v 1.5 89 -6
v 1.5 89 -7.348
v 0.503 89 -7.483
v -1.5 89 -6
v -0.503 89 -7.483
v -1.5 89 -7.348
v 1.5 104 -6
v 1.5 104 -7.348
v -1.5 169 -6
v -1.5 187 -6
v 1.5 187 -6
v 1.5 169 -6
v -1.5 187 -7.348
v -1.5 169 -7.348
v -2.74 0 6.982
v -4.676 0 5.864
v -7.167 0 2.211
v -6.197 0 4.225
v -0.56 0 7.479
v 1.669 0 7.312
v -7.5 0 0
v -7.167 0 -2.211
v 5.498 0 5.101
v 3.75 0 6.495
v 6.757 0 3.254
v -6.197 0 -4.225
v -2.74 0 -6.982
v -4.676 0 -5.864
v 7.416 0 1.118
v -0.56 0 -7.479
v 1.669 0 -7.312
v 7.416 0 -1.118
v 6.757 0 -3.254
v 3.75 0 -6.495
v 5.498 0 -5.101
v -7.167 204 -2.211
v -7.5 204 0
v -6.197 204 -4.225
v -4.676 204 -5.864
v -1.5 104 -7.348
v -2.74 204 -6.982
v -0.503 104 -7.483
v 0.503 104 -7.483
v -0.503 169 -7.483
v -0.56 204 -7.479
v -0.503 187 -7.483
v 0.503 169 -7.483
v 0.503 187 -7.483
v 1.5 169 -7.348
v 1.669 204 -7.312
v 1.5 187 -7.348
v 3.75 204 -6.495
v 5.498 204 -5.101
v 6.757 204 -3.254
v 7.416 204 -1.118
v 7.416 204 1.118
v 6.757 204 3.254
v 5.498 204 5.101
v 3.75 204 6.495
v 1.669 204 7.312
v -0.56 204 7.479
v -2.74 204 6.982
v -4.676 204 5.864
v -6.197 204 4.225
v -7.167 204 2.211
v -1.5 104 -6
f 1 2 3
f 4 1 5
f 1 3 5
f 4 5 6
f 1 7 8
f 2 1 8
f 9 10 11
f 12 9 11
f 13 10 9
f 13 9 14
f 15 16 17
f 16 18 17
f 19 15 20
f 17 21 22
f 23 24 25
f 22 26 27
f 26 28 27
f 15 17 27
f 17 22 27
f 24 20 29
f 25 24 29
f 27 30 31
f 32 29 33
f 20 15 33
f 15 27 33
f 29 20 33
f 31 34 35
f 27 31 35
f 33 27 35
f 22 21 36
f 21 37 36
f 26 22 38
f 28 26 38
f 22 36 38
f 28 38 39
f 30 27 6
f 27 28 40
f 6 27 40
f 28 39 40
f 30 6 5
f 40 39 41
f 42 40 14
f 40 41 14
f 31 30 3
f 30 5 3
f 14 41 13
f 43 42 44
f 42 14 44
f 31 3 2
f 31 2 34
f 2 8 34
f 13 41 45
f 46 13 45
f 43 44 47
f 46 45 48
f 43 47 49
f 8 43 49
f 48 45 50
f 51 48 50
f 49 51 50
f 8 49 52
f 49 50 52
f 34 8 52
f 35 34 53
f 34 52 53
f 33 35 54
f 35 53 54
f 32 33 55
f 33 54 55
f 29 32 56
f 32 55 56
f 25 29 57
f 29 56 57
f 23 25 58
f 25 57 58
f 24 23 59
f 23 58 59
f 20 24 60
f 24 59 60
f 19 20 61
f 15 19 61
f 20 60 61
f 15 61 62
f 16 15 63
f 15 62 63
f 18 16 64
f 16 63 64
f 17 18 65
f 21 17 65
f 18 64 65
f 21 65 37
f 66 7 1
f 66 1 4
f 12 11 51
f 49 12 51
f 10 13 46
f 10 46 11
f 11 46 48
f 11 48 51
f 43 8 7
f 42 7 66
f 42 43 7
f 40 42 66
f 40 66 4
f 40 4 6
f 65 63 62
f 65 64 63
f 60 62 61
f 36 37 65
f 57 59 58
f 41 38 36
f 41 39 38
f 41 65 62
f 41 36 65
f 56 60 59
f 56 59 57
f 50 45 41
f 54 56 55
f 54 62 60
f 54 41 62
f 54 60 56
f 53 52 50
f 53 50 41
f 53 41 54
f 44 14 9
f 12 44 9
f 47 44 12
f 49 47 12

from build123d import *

# Parameters (mm, degrees)
SKETCH1_W          = 7.5
SKETCH1_H          = 204
SKETCH2_W          = 3
SKETCH2_H          = 3
CUT_EXTRUDE1_DEPTH = 18
SKETCH3_W          = 3
SKETCH3_H          = 3
CUT_EXTRUDE2_DEPTH = 15


with BuildPart() as part:
    # Sketch1 → Revolve1 (revolve)
    with BuildSketch(Plane.XY, mode=Mode.PRIVATE) as revolve1_sk:
        with Locations((3.75, 102)):
            Rectangle(SKETCH1_W, SKETCH1_H)
    revolve(revolve1_sk.sketch.rotate(Axis((0, 204, 0), (0, -1, 0)), 180), axis=Axis((0, 204, 0), (0, -1, 0)))

    # Sketch2 → Cut-Extrude1 (cut)
    with BuildSketch(Plane(origin=(0, 187, 0), x_dir=(1, 0, 0), z_dir=(0, 1, 0))):
        with Locations((0, 7.5)):
            Rectangle(SKETCH2_W, SKETCH2_H)
    extrude(amount=-CUT_EXTRUDE1_DEPTH, mode=Mode.SUBTRACT)

    # Sketch3 → Cut-Extrude2 (cut)
    with BuildSketch(Plane(origin=(0, 104, 0), x_dir=(-1, 0, 0), z_dir=(0, -1, 0))):
        with Locations((0, 7.5)):
            Rectangle(SKETCH3_W, SKETCH3_H)
    extrude(amount=CUT_EXTRUDE2_DEPTH, mode=Mode.SUBTRACT)


solid = part.part
